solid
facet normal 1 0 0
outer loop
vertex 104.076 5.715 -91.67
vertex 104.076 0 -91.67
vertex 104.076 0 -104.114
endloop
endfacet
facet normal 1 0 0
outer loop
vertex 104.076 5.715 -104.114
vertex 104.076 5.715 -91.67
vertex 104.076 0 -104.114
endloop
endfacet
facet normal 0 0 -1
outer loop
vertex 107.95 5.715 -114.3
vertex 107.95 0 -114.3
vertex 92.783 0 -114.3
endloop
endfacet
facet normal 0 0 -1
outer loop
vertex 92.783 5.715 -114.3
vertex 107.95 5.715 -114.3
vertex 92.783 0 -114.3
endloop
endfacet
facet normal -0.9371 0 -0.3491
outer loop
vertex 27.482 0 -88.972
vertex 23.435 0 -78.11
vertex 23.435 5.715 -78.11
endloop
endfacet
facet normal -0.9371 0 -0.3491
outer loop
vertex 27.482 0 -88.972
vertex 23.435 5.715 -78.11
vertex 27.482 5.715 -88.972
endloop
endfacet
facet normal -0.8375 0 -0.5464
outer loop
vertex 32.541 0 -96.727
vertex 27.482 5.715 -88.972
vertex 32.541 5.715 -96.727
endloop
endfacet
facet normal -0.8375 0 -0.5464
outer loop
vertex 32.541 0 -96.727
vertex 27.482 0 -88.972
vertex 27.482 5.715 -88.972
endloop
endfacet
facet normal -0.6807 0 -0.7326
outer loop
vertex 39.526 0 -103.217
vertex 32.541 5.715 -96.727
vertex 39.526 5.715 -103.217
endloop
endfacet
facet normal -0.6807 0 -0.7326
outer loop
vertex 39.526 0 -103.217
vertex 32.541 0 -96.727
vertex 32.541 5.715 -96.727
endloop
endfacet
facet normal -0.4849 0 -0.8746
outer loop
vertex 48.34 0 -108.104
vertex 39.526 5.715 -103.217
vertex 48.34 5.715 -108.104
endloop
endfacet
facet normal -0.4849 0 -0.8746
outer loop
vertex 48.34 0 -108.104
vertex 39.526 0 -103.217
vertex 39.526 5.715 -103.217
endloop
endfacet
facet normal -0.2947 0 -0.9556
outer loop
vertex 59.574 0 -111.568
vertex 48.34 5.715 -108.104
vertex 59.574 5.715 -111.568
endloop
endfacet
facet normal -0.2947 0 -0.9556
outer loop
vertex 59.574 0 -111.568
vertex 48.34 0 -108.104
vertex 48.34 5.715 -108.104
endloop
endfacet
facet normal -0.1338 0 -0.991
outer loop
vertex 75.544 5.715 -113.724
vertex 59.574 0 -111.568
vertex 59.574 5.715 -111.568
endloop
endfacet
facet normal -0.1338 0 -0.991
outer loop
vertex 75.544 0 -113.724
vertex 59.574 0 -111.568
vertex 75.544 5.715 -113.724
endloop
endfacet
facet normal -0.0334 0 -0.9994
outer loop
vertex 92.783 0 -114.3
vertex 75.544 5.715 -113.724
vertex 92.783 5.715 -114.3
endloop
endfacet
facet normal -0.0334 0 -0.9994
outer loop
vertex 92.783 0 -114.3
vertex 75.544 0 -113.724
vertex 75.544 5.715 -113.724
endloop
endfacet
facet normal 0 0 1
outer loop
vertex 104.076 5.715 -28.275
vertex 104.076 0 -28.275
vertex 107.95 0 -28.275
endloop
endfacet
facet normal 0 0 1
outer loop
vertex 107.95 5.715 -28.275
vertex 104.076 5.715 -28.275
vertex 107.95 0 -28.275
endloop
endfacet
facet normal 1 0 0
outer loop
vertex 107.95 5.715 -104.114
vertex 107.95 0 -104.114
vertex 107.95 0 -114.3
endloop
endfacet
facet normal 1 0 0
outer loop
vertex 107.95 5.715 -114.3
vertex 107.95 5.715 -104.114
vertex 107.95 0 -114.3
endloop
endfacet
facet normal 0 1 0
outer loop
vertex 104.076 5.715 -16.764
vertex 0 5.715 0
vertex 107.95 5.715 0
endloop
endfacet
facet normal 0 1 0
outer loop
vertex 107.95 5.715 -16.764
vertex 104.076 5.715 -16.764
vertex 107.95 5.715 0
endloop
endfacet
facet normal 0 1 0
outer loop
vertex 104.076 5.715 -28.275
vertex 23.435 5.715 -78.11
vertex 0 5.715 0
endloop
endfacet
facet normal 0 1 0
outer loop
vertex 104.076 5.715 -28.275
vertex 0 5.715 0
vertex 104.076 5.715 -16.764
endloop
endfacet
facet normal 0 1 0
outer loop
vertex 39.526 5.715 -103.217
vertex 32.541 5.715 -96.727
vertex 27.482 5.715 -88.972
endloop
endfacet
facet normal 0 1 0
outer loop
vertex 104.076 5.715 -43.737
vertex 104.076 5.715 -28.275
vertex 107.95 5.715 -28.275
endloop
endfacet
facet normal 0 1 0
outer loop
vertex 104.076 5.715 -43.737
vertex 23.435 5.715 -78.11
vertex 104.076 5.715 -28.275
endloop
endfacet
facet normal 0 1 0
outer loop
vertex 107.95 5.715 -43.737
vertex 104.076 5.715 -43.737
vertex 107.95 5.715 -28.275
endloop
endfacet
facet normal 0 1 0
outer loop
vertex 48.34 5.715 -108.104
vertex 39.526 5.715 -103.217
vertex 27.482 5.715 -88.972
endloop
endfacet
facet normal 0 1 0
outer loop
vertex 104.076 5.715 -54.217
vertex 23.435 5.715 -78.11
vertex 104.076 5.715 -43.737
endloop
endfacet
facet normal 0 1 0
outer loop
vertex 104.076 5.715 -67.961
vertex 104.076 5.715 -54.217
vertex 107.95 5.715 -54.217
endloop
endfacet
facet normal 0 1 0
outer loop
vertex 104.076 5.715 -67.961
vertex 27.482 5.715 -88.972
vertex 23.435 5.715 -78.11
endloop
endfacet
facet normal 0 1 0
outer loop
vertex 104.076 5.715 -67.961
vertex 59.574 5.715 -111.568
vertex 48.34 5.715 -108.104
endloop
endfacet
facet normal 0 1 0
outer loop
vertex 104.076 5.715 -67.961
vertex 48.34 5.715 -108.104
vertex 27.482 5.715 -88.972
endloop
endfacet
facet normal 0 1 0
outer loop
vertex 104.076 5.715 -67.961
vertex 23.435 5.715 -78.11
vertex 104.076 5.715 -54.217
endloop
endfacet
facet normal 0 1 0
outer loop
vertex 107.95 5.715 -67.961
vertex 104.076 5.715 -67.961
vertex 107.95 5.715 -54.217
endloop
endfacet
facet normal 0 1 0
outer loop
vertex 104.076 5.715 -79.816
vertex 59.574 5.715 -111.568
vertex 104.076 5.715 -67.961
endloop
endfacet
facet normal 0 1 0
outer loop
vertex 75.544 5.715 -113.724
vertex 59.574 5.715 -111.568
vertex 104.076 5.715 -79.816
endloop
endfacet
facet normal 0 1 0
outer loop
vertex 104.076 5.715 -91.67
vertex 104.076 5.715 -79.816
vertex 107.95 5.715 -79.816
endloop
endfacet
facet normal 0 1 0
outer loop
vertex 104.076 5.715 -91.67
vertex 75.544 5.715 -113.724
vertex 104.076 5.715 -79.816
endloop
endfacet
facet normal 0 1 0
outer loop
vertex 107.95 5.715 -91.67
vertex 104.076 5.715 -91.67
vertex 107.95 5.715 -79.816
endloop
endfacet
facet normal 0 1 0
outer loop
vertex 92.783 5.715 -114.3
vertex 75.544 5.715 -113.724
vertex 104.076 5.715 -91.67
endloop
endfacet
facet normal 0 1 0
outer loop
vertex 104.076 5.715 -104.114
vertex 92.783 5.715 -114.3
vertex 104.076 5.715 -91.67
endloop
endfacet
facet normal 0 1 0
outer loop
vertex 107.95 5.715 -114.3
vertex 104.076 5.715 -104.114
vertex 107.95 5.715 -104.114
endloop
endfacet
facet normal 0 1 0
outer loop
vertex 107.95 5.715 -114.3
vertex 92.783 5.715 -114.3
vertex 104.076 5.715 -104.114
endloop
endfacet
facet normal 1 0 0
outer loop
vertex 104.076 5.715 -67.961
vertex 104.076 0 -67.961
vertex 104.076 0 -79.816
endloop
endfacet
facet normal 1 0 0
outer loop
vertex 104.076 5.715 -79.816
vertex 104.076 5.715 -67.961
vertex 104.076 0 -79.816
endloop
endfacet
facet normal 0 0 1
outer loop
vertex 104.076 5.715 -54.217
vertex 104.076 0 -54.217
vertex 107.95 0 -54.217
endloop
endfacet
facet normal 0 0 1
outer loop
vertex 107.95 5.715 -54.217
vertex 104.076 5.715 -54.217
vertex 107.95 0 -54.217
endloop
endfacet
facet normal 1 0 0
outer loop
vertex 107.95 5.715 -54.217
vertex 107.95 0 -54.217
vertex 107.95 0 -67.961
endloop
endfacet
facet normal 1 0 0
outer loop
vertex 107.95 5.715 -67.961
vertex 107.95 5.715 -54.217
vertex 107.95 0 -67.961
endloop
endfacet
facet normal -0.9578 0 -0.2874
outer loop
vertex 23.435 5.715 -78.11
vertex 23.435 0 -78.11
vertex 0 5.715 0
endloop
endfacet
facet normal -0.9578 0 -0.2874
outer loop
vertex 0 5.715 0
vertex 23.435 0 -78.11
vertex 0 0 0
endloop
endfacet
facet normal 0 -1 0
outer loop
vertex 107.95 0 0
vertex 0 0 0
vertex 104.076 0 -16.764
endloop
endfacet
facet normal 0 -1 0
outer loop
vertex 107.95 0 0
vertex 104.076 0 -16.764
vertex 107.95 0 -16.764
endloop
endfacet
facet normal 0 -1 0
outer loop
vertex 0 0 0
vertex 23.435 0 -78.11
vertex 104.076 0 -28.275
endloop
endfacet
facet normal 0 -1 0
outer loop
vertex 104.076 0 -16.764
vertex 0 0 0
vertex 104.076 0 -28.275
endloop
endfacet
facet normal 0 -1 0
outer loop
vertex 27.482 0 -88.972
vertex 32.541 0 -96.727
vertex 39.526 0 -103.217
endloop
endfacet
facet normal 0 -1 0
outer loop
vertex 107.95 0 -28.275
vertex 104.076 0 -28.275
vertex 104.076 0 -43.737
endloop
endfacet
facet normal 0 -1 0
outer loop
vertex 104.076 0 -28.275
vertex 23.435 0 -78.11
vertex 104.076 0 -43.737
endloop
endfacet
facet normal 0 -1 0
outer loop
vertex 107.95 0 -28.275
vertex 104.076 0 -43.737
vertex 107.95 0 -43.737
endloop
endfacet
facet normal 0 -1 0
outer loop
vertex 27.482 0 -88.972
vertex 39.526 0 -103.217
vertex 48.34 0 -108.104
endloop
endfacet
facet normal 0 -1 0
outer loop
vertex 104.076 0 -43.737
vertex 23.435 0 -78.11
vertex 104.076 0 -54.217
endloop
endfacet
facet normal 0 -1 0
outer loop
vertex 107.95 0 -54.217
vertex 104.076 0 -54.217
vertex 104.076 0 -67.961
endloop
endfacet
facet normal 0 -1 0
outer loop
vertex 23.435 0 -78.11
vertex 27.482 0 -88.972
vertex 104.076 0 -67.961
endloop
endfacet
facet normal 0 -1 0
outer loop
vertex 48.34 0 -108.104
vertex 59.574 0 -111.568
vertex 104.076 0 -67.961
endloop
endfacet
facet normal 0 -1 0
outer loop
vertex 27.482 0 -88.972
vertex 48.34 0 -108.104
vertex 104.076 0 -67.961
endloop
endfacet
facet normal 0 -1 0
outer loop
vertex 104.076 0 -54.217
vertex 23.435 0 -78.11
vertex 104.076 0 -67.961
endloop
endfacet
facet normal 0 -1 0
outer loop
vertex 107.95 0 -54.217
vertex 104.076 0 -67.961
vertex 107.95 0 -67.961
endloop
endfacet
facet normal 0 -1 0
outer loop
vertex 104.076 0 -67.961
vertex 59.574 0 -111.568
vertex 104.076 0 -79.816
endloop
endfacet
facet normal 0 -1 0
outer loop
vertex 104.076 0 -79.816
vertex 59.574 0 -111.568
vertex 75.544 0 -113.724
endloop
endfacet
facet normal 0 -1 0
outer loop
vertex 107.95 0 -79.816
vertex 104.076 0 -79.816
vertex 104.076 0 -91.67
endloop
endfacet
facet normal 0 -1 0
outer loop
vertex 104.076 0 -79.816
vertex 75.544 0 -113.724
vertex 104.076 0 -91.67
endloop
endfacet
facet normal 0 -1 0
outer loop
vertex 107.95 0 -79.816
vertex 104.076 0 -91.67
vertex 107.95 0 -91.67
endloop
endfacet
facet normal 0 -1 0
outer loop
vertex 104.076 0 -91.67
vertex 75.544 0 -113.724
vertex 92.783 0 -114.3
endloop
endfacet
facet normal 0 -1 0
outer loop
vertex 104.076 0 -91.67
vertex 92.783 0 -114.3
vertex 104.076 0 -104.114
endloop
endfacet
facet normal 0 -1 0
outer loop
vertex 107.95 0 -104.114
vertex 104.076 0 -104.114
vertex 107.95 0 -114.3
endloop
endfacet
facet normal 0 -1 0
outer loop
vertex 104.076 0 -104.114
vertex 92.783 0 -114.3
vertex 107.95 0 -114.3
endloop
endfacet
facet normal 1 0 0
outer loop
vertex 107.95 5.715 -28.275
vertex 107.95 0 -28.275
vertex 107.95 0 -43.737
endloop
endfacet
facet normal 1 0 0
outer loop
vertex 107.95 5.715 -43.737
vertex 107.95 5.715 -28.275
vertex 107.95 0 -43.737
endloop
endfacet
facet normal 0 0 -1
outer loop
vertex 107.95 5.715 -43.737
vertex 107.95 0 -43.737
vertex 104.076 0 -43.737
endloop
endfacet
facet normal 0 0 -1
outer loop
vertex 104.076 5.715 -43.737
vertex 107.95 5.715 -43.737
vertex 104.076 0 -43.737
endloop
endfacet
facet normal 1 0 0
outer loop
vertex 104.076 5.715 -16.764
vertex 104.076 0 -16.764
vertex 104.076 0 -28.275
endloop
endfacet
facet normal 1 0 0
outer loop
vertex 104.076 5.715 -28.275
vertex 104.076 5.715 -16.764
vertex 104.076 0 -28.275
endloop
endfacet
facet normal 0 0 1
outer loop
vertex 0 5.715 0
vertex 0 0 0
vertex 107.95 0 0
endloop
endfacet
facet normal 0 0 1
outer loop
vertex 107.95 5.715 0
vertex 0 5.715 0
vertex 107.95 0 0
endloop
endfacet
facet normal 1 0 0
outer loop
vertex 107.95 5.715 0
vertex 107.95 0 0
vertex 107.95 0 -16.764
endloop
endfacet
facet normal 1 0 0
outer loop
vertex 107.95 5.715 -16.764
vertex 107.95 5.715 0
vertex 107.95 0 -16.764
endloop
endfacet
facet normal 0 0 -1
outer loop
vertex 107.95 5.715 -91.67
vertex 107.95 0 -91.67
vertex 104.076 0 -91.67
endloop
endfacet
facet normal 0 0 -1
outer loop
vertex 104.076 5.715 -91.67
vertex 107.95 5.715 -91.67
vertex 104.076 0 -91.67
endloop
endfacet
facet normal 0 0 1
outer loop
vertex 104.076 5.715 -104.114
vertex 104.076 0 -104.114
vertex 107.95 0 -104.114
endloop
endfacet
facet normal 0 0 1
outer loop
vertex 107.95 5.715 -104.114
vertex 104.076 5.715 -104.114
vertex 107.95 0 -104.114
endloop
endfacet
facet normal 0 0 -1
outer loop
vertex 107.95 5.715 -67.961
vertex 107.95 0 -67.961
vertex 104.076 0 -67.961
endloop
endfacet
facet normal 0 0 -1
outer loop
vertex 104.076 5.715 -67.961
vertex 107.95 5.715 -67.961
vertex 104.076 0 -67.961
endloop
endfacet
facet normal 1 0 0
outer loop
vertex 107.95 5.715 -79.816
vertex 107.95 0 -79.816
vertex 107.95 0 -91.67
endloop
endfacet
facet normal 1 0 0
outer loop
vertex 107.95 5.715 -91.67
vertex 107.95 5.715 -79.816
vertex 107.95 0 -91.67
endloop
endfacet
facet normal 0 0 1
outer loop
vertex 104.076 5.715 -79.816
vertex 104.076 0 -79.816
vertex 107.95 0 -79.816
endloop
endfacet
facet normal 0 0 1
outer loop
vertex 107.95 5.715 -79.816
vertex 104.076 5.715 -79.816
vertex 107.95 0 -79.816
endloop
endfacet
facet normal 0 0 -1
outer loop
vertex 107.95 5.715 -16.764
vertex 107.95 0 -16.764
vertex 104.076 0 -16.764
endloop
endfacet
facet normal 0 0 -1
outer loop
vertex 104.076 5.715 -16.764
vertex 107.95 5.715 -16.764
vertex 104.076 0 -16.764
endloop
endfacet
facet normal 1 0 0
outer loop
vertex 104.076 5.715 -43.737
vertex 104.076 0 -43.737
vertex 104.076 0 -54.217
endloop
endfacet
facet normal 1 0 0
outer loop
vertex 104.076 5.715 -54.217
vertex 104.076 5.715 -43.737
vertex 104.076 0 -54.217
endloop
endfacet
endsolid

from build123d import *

# Parameters (mm, degrees)
BOSS_EXTRUDE1_DEPTH = 5.715


with BuildPart() as part:
    # Sketch1 → Boss-Extrude1 (new body)
    with BuildSketch(Plane(origin=(0, 0, 0), x_dir=(1, 0, 0), z_dir=(0, 1, 0))):
        with BuildLine():
            Line((23.434979066, 78.109868229), (0, 0))
            Line((0, 0), (107.95, 0))
            Line((107.95, 0), (107.95, 16.763624127))
            Line((107.95, 16.763624127), (104.075854958, 16.763624127))
            Line((104.075854958, 16.763624127), (104.075854958, 28.274535242))
            Line((104.075854958, 28.274535242), (107.95, 28.274535242))
            Line((107.95, 28.274535242), (107.95, 43.736953157))
            Line((107.95, 43.736953157), (104.075854958, 43.736953157))
            Line((104.075854958, 43.736953157), (104.075854958, 54.217036411))
            Line((104.075854958, 54.217036411), (107.95, 54.217036411))
            Line((107.95, 54.217036411), (107.95, 67.961407891))
            Line((107.95, 67.961407891), (104.075854958, 67.961407891))
            Line((104.075854958, 67.961407891), (104.075854958, 79.815928293))
            Line((104.075854958, 79.815928293), (107.95, 79.815928293))
            Line((107.95, 79.815928293), (107.95, 91.670448695))
            Line((107.95, 91.670448695), (104.075854958, 91.670448695))
            Line((104.075854958, 91.670448695), (104.075854958, 104.11377721))
            Line((104.075854958, 104.11377721), (107.95, 104.11377721))
            Line((107.95, 104.11377721), (107.95, 114.3))
            Line((107.95, 114.3), (92.782636258, 114.3))
            add(Edge.make_bspline(
                [(23.434979066, 78.109868229), (23.977674271, 79.918696425), (33.365084494, 111.207368521), (62.592771748, 114.091936467), (92.782636258, 114.3)],
                knots=[0, 0, 0, 0, 0.05, 0.864887892, 0.864887892, 0.864887892, 0.864887892], degree=3))
        make_face()
    extrude(amount=BOSS_EXTRUDE1_DEPTH)


solid = part.part
